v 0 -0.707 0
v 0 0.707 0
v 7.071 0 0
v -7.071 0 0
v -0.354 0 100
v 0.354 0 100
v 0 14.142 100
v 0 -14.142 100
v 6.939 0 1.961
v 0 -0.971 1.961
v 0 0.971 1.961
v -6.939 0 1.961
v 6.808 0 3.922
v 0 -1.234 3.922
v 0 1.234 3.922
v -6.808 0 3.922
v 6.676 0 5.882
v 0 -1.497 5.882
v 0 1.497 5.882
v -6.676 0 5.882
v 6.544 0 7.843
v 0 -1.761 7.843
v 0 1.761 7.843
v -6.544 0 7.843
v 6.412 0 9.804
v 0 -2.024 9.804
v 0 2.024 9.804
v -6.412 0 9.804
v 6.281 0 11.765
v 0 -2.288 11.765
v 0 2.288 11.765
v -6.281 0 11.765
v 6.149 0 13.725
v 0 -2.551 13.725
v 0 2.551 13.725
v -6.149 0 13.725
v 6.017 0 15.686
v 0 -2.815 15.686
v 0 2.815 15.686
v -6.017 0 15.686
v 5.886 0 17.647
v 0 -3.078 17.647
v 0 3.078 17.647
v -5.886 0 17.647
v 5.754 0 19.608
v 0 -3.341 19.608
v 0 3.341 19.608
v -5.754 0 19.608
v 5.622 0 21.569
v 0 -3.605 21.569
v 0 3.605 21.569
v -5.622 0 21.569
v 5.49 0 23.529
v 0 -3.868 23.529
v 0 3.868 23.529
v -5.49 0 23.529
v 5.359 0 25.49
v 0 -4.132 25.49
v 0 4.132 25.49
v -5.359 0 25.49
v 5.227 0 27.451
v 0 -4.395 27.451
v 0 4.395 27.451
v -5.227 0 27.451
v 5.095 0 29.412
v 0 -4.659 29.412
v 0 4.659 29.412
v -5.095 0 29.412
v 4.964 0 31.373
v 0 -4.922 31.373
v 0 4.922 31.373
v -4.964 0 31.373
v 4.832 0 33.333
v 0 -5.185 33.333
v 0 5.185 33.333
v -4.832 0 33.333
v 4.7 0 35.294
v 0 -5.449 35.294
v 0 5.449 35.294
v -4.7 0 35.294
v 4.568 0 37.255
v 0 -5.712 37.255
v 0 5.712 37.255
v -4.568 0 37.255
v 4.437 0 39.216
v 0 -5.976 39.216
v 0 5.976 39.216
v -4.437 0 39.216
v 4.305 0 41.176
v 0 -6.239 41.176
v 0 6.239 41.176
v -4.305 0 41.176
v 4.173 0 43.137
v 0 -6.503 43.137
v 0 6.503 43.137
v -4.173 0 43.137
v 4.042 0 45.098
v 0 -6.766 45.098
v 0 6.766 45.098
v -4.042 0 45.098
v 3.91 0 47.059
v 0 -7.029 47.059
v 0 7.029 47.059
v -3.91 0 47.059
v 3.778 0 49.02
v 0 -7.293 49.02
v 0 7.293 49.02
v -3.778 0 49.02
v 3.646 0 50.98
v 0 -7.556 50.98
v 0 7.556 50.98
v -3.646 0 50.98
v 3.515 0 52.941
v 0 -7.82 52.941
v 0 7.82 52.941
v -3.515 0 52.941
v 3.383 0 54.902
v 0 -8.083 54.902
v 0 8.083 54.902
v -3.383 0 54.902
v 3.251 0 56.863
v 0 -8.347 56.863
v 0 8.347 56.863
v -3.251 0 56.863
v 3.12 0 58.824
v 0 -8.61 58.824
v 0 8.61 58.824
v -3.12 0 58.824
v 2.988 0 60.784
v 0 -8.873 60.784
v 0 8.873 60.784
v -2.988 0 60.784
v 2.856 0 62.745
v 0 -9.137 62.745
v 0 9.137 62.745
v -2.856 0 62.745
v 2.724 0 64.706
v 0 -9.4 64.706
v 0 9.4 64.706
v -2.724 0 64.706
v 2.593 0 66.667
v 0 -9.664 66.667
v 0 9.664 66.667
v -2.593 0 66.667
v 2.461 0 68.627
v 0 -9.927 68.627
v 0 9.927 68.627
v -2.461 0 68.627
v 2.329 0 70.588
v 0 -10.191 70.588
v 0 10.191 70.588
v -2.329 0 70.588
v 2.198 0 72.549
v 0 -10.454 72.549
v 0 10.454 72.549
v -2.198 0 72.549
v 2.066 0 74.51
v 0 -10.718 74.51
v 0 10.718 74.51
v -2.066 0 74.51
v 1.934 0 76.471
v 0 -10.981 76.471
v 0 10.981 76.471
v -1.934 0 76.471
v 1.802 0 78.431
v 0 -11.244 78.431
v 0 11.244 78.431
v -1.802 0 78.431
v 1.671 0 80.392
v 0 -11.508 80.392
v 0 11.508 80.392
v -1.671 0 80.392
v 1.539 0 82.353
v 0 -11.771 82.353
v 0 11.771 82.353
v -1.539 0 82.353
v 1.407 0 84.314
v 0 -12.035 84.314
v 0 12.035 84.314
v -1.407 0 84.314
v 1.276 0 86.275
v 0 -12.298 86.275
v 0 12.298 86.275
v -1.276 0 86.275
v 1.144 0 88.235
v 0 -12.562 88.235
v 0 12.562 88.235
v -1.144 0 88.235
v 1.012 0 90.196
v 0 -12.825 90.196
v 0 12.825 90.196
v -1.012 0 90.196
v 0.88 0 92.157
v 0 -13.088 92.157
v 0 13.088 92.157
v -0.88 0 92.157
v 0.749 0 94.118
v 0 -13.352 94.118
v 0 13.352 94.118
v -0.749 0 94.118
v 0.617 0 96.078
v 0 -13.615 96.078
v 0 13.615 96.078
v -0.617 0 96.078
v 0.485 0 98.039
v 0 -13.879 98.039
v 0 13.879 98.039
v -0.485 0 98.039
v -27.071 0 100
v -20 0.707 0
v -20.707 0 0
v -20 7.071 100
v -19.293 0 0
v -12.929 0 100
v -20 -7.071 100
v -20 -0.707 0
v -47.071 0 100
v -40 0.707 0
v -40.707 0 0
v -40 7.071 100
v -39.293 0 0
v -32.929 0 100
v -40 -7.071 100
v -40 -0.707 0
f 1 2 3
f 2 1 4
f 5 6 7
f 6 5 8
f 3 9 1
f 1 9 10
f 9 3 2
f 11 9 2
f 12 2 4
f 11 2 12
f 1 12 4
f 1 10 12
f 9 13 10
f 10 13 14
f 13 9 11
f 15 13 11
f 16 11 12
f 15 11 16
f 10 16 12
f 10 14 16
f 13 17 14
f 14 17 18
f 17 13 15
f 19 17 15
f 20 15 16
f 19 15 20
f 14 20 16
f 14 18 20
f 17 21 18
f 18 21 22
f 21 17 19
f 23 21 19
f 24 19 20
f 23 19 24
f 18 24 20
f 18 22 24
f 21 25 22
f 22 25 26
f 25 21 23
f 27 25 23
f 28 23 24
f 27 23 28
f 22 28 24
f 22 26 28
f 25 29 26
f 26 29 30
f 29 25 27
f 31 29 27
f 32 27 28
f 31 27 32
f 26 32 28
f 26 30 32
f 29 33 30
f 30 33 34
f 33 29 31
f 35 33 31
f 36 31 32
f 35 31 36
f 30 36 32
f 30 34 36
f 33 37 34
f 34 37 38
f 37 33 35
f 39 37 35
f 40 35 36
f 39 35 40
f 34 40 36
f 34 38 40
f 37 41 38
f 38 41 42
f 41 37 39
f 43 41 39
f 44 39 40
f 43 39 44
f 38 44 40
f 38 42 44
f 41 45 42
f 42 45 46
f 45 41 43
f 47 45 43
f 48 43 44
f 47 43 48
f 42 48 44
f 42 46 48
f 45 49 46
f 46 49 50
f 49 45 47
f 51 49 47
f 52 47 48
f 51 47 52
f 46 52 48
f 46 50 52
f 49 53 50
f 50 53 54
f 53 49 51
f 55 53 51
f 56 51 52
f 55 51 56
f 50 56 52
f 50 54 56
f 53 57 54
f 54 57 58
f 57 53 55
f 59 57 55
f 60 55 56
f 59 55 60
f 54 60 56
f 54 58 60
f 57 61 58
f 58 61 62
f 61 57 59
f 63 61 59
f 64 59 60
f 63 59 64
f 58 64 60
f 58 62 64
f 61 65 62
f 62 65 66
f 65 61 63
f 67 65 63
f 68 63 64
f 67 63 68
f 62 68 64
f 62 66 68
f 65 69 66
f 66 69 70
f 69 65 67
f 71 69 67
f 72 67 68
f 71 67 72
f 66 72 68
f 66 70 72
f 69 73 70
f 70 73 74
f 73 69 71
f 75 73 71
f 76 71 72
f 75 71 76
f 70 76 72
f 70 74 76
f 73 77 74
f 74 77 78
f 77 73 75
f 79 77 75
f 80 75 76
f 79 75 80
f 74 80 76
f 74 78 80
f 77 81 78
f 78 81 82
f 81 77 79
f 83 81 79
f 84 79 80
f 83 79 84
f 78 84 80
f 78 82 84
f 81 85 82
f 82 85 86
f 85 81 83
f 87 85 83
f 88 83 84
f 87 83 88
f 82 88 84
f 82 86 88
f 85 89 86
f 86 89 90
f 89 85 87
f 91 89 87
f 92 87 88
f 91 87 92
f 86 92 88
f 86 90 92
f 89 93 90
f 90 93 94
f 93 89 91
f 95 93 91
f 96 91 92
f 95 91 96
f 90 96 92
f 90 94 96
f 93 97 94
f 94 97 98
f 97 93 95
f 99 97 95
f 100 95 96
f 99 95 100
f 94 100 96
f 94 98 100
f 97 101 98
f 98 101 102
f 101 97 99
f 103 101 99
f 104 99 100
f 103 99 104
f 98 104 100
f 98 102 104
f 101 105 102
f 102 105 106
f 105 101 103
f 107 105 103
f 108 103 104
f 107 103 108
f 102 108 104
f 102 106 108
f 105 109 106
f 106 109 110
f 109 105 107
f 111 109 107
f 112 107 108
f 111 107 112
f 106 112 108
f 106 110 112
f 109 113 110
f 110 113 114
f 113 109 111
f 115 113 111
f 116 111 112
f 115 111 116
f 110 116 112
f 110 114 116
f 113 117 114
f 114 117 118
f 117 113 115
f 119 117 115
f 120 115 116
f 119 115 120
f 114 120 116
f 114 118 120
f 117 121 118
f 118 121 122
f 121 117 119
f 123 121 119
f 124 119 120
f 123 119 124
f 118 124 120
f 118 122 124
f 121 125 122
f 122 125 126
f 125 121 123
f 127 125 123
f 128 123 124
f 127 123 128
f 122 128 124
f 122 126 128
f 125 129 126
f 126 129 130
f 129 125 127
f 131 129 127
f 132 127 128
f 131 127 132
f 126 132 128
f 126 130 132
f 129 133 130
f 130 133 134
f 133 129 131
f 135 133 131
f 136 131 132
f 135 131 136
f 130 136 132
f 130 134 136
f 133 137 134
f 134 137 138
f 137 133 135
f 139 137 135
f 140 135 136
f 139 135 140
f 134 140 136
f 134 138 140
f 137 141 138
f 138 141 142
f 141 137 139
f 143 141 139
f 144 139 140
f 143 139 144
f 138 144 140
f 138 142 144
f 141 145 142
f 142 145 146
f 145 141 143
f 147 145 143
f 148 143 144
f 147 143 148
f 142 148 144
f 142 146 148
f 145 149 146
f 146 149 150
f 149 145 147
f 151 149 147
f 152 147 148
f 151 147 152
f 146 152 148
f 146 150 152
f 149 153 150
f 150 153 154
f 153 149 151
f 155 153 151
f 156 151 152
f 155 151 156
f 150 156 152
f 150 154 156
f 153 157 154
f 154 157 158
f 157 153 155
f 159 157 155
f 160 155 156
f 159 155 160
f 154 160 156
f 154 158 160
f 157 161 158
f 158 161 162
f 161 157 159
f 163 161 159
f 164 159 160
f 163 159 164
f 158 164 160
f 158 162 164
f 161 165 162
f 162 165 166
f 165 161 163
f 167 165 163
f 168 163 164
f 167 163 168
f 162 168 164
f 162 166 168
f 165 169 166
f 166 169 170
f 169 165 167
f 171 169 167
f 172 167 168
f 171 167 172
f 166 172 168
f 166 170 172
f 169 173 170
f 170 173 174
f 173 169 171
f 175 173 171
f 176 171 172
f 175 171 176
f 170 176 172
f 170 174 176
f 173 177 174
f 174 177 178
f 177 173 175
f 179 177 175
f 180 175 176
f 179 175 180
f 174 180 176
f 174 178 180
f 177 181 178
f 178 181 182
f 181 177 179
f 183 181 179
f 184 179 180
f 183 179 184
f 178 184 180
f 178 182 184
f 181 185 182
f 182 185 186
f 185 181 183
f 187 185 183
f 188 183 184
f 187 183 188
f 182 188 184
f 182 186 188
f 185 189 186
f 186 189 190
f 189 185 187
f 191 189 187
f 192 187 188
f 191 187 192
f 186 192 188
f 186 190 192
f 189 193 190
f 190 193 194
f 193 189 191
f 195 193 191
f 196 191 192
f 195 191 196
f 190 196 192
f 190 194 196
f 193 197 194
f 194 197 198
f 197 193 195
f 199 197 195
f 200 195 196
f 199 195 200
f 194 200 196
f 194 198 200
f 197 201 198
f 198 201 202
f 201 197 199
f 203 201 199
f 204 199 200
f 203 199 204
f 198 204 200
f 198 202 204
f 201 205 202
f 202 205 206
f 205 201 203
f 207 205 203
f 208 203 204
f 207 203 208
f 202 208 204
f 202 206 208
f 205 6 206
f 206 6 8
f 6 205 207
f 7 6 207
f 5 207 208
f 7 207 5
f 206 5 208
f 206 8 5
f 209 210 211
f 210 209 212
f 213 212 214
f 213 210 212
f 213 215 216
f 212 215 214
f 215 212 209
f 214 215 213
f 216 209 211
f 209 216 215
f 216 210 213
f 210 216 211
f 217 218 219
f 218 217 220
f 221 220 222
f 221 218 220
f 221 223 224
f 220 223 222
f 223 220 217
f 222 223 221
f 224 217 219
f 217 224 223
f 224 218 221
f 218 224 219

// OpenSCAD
// This file is to test features which can't be seen (well or at-all) without edges enabled.

// Non-uniformly-scaled untwisted extrude, default slicing.
// Expect multiple horizontal slices.
linear_extrude(h=30, scale=[1/20,20]) scale([1,0.1]) rotate(45) square(10, center=true);

// Uniformly-scaled untwisted extrude, default slicing.
// Expect no horizontal slices.
translate([-20,0,0]) linear_extrude(h=30, scale=[10,10]) scale([0.1,0.1]) rotate(45) square(10, center=true);

// Uniformly-scaled untwisted extrude, explicit slicing.
// Expect three horizontal slices (2 cuts).
translate([-40,0,0]) linear_extrude(h=30, scale=[10,10], slices=3) scale([0.1,0.1]) rotate(45) square(10, center=true);
